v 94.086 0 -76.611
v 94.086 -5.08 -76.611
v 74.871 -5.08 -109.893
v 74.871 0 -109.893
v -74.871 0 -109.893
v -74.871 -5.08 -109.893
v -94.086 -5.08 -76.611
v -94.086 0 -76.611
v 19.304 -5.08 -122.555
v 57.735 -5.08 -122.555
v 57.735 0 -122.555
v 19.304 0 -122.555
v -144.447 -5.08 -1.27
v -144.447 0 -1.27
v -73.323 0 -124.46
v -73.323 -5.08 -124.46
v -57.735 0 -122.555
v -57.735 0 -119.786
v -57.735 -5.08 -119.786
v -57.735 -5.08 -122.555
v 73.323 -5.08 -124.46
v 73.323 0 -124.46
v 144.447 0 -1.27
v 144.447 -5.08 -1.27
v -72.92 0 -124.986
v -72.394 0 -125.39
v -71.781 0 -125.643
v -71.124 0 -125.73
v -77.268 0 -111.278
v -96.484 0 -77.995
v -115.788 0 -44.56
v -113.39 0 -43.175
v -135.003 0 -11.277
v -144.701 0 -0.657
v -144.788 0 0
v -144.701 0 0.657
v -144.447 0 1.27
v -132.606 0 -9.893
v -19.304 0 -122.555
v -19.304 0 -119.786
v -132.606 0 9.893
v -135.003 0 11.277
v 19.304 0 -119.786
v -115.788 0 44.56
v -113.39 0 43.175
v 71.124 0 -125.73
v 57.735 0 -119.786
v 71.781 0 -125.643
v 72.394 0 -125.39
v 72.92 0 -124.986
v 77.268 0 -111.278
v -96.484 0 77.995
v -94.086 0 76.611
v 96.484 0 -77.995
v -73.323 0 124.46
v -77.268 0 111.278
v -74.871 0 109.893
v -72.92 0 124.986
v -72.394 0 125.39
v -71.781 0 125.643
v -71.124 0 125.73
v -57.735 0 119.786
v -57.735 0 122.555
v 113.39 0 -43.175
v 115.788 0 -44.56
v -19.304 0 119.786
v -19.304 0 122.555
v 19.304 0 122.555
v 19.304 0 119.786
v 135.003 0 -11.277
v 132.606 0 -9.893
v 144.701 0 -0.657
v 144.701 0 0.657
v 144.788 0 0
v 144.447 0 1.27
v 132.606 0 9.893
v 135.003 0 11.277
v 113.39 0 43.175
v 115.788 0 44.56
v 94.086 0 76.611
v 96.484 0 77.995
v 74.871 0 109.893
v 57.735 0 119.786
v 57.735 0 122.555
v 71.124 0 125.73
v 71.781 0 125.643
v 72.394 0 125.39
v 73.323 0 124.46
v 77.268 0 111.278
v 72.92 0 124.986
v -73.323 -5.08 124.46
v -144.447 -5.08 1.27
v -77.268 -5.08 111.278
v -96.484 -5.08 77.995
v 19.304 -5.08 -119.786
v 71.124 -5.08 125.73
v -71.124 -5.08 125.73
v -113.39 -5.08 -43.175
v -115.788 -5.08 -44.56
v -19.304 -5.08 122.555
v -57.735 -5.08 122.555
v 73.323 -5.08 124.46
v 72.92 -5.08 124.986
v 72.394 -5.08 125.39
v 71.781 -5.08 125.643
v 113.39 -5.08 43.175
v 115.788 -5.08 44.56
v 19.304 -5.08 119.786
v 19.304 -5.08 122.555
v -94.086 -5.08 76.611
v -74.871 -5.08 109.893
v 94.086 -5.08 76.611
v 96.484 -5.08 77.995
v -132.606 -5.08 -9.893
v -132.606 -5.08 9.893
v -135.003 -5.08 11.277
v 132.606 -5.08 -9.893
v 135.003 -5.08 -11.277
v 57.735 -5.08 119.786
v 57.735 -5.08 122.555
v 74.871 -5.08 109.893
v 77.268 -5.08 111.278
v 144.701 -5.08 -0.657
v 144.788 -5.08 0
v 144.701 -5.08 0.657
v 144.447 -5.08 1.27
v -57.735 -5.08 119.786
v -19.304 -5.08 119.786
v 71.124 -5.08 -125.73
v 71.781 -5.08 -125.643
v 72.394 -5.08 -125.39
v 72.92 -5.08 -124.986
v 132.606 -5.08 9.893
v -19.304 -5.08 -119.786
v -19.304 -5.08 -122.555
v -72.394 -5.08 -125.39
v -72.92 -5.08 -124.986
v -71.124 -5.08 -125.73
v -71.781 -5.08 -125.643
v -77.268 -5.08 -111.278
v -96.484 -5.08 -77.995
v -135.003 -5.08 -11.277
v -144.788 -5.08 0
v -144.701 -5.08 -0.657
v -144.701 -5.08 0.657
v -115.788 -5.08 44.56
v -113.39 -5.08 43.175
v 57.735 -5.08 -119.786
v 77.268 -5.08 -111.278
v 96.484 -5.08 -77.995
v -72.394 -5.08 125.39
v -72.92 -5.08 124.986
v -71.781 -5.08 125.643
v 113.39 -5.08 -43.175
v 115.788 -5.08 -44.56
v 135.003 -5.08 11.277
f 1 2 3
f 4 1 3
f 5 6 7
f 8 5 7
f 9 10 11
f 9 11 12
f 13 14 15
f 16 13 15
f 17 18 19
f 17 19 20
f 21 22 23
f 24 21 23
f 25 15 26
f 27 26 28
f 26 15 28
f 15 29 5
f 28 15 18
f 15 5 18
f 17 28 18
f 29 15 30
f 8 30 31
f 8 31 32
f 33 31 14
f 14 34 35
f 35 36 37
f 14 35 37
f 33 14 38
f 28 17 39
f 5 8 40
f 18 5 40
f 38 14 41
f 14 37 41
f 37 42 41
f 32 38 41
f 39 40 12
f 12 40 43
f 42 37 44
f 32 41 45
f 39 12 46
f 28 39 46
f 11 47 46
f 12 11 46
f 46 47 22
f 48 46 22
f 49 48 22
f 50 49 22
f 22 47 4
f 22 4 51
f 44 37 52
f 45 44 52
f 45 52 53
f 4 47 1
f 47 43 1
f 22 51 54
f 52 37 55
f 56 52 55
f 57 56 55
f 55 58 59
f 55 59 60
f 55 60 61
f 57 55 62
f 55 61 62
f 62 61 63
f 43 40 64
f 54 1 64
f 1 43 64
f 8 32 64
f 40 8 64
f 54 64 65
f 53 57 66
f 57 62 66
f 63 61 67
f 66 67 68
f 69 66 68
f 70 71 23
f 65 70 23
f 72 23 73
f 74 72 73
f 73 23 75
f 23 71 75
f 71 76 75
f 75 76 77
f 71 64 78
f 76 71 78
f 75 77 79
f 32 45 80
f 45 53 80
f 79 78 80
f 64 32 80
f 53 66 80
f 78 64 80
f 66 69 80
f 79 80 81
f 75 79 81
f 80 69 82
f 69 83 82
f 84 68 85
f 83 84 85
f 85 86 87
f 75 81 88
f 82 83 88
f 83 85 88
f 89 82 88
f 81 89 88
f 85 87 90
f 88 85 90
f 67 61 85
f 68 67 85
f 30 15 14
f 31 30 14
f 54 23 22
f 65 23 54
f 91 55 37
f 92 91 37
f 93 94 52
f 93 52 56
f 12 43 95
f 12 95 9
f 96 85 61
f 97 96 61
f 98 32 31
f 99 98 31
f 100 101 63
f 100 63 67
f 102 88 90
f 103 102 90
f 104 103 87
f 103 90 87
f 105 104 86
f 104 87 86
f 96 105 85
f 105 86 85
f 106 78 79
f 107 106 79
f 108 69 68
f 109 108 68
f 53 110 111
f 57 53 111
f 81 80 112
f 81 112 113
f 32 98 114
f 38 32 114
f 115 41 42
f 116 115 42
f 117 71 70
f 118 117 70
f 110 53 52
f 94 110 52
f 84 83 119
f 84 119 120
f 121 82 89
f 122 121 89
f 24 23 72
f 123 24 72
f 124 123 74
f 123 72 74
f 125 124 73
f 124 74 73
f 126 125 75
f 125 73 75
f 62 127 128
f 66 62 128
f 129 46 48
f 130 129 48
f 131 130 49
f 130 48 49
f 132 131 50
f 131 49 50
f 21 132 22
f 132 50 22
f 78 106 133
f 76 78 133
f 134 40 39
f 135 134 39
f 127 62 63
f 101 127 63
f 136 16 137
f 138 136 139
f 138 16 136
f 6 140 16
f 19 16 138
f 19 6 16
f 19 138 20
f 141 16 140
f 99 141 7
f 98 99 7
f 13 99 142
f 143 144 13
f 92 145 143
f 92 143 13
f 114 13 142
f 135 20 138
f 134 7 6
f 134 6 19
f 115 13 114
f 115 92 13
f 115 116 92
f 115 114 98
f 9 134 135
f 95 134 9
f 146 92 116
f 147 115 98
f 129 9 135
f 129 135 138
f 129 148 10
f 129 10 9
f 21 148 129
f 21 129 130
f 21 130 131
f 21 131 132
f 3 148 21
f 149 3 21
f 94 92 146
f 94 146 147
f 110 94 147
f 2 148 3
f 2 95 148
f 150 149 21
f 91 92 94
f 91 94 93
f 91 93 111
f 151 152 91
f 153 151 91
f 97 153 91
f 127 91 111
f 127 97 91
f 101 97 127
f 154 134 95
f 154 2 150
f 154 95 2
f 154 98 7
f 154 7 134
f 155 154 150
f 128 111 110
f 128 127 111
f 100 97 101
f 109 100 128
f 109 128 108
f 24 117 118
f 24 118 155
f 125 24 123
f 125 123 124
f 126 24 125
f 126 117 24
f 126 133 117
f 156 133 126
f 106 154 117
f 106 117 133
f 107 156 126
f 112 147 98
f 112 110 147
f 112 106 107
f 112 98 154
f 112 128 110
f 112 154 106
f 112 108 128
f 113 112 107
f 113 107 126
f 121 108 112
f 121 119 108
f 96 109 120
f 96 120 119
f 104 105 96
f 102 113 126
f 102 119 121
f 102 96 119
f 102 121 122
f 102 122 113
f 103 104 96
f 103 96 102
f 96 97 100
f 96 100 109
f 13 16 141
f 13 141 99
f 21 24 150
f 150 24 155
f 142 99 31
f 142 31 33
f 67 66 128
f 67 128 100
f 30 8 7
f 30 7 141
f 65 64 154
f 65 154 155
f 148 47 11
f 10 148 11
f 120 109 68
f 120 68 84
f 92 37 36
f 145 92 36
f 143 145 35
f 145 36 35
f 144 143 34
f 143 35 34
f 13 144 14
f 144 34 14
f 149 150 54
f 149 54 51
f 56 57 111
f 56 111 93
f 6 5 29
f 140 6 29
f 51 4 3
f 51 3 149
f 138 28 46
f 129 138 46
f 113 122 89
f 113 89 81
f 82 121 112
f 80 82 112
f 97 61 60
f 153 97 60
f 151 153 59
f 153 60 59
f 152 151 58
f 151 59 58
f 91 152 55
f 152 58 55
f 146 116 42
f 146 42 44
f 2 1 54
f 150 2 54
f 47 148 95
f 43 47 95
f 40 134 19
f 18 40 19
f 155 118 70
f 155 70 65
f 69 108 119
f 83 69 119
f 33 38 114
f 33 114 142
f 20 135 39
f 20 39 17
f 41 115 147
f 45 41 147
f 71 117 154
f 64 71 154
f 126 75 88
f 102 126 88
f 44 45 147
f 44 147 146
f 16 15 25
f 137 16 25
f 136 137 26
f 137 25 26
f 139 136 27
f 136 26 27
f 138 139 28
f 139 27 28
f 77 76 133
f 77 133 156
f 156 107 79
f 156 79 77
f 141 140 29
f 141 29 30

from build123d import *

# Parameters (mm, degrees)
F1_DEPTH        = 5.08
F2_W            = 38.4310525078
F2_H            = 2.7686
F3_DEPTH        = 5.08
F3_COPIES_COUNT = 6


# Not quite as in the source:
# - a pattern or mirror of a feature is missing from the dataset's text; its kind, count and spacing are read off the source's solid


with BuildPart() as f1:
    # F0 (on Front) → F1 (new body)
    with BuildSketch(Plane.XZ):
        with BuildLine():
            Line((71.1237796615, 125.73), (-71.1237796615, 125.73))
            ThreePointArc((-71.1237796615, 125.73), (-72.3937796615, 125.3897045256), (-73.3234841871, 124.46))
            Line((-73.3234841871, 124.46), (-144.4472638486, 1.27))
            ThreePointArc((-144.4472638486, 1.27), (-144.7875593229, 0), (-144.4472638486, -1.27))
            Line((-144.4472638486, -1.27), (-73.3234841871, -124.46))
            ThreePointArc((-73.3234841871, -124.46), (-72.3937796615, -125.3897045256), (-71.1237796615, -125.73))
            Line((-71.1237796615, -125.73), (71.1237796615, -125.73))
            ThreePointArc((71.1237796615, -125.73), (72.3937796615, -125.3897045256), (73.3234841871, -124.46))
            Line((73.3234841871, -124.46), (144.4472638486, -1.27))
            ThreePointArc((144.4472638486, -1.27), (144.7875593229, 0), (144.4472638486, 1.27))
            Line((144.4472638486, 1.27), (73.3234841871, 124.46))
            ThreePointArc((73.3234841871, 124.46), (72.3937796615, 125.3897045256), (71.1237796615, 125.73))
        make_face()
    extrude(amount=F1_DEPTH)

    # F2 (on face) → F3 (cut, through all)
    with BuildSketch(Plane.XZ.offset(5.08)):
        with Locations((-38.5195262539, 121.1707)):
            Rectangle(F2_W, F2_H)
        with Locations((38.5195262539, 121.1707)):
            Rectangle(F2_W, F2_H)
    f3 = extrude(amount=-F3_DEPTH, mode=Mode.SUBTRACT)

    # F3_copies: F3 ×6 about axis
    f3_copies_axis = Axis((0, 0, 0), (0, 1, 0))
    for i in range(1, F3_COPIES_COUNT):
        add(f3.rotate(f3_copies_axis, i * 360 / F3_COPIES_COUNT), mode=Mode.SUBTRACT)


solid = f1.part
